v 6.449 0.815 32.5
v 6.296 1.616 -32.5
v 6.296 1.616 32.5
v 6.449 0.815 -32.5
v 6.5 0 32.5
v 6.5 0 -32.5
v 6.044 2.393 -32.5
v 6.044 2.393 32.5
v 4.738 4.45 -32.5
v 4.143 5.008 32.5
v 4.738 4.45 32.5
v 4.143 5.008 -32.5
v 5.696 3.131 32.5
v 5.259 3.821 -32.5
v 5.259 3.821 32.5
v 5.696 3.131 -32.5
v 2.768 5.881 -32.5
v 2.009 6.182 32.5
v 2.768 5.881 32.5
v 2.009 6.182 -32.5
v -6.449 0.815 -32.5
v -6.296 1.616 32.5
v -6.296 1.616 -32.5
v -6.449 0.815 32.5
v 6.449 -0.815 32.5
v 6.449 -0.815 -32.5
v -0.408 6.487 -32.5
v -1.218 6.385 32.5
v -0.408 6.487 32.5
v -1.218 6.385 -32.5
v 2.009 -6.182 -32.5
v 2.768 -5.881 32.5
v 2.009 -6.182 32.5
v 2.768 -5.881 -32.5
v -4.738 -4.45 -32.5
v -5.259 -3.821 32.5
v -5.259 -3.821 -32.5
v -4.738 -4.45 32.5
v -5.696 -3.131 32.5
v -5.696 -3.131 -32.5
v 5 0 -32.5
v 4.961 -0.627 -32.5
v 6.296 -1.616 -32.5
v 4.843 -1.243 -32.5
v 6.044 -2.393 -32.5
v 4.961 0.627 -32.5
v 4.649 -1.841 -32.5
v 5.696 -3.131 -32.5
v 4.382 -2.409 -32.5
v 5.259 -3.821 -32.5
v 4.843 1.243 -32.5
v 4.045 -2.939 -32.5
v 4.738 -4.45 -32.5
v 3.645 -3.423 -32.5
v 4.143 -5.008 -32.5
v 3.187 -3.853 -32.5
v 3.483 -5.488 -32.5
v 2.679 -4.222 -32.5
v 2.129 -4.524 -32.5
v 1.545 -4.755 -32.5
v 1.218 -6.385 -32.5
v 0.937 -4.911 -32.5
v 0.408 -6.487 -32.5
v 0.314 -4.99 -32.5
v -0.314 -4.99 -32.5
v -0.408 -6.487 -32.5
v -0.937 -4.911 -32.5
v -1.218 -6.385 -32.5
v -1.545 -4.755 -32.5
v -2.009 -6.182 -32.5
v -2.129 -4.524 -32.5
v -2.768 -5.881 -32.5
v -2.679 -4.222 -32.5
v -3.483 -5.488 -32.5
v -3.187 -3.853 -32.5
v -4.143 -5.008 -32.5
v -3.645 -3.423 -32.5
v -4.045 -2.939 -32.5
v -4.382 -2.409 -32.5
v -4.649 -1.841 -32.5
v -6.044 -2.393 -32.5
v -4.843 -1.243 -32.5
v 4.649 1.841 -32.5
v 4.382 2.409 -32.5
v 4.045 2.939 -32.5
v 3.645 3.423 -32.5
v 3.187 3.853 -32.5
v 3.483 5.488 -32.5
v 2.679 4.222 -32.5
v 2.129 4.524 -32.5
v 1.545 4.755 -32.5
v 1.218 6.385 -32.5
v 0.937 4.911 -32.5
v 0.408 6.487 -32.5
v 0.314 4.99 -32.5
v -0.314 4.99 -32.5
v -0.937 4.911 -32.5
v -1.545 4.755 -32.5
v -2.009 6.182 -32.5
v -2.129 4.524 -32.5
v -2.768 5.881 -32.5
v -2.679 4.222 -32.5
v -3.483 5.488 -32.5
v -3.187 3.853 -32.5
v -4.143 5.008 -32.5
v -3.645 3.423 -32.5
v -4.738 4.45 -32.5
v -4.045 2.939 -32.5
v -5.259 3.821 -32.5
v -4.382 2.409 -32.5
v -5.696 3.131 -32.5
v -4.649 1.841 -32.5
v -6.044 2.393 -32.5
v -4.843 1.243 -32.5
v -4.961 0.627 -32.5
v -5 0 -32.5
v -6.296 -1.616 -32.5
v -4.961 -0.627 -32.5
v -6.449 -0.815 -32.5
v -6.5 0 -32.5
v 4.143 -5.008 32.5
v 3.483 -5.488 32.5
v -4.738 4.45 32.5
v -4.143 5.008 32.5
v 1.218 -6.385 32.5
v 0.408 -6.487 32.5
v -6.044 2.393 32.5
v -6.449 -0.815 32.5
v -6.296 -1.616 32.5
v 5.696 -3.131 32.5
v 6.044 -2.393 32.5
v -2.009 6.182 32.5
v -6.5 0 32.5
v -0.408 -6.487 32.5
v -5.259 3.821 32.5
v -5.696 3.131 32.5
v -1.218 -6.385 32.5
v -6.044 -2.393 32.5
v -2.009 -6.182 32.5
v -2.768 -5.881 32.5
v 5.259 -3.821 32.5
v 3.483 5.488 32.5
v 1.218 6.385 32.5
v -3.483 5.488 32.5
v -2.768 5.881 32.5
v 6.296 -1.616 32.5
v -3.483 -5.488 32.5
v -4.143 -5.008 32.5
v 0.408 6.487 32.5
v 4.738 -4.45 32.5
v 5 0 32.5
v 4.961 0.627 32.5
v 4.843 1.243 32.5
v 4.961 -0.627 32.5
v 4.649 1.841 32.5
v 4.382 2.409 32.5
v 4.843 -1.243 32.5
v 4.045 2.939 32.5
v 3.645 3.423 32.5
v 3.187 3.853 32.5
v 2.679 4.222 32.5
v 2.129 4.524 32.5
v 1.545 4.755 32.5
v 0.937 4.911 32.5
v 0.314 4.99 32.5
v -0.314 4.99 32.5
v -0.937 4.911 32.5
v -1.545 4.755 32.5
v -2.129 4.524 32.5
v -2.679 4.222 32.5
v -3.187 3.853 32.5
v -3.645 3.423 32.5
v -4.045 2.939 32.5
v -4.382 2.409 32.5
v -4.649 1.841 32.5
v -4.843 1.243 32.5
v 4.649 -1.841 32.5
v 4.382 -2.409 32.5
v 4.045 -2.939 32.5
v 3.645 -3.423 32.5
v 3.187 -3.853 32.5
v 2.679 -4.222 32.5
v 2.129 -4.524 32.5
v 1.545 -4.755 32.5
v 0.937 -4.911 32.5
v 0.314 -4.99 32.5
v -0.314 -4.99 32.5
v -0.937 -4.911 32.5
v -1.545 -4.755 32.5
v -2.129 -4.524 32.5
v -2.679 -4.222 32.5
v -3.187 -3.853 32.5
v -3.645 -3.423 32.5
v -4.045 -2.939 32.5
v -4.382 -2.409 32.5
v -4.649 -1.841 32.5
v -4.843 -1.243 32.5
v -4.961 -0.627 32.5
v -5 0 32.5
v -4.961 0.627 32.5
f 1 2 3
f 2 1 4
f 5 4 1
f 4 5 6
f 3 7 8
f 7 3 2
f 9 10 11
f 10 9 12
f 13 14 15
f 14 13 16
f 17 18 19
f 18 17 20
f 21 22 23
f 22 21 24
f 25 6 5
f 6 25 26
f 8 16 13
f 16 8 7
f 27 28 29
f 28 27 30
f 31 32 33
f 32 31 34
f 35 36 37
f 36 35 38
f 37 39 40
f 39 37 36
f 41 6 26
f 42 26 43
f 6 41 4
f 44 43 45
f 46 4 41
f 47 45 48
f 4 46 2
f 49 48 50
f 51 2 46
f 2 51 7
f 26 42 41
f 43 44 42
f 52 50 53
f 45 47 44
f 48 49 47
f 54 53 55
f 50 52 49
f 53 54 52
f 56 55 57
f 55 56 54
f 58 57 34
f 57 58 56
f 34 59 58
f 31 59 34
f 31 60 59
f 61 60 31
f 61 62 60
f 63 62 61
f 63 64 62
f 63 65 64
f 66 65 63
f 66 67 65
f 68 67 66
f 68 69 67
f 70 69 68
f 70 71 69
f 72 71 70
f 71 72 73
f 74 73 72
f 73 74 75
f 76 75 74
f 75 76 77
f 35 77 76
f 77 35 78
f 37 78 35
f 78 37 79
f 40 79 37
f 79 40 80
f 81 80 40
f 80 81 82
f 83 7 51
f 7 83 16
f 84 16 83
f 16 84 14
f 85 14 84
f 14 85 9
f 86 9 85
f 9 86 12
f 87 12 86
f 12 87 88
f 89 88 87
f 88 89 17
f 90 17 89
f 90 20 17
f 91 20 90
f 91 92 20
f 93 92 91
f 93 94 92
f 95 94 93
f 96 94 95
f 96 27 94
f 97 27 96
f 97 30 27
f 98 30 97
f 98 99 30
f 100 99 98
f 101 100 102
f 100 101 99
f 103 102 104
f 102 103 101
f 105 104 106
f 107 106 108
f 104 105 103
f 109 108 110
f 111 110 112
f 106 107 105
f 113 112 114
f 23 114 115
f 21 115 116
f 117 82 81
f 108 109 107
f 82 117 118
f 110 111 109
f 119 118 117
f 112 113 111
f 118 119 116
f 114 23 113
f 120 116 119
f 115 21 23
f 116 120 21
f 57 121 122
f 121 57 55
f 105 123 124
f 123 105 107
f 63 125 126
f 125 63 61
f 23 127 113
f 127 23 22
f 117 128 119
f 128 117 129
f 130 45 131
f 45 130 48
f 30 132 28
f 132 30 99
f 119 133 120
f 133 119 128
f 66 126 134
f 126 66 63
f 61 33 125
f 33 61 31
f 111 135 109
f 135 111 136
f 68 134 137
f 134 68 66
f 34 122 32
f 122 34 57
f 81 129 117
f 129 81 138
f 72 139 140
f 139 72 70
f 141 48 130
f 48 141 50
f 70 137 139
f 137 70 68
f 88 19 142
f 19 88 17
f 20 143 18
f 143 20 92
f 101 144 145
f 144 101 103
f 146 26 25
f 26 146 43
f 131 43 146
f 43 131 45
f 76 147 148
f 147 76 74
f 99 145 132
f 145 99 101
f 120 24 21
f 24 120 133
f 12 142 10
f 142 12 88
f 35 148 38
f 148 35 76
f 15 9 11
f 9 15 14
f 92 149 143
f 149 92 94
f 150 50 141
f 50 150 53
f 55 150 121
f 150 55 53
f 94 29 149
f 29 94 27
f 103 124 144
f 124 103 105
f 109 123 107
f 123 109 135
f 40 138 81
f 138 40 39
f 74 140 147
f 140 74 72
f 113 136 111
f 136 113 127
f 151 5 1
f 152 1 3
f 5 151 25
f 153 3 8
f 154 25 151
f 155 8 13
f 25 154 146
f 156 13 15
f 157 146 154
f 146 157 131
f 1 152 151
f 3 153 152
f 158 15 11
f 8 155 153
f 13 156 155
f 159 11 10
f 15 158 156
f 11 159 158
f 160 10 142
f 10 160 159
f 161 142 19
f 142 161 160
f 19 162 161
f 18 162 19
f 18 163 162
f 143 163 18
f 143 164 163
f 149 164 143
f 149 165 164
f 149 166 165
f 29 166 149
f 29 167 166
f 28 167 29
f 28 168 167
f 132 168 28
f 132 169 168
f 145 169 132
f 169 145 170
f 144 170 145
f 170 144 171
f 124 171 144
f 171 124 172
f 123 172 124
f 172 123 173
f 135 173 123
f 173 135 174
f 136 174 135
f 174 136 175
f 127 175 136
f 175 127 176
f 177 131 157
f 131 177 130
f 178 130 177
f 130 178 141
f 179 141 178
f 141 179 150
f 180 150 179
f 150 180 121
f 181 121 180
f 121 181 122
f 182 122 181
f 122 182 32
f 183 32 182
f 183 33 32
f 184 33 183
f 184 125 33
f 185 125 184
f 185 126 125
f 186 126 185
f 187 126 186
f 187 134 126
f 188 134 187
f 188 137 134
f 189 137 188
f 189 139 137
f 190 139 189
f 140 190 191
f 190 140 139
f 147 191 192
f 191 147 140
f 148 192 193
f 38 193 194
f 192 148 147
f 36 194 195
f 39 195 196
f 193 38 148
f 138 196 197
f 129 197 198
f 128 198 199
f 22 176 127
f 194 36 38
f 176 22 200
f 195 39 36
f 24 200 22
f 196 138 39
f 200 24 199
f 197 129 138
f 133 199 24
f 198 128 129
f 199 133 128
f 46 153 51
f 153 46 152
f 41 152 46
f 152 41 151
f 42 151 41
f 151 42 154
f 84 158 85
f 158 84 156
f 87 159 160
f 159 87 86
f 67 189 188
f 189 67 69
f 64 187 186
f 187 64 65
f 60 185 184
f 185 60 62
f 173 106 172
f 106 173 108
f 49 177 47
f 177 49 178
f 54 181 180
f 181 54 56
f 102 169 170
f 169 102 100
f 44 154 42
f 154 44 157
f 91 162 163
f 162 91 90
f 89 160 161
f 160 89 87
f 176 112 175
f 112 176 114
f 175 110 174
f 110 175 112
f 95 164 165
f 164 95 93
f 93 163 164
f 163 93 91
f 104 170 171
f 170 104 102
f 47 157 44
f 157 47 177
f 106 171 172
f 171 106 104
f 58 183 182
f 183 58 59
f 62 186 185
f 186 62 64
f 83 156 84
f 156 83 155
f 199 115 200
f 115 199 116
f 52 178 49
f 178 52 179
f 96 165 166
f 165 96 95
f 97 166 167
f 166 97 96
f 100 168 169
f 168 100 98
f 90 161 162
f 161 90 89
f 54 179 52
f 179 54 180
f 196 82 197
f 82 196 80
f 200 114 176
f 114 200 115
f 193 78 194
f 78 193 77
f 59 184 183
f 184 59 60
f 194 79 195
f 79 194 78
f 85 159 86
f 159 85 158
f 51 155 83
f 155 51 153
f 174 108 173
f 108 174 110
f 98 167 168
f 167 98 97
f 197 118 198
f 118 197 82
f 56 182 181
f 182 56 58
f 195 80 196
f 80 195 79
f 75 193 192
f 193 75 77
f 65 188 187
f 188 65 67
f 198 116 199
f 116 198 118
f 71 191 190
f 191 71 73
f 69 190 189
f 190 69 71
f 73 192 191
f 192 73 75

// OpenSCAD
$fn = 50;


difference() {
	union() {
		translate(v = [0, 0, -32.5000000000]) {
			cylinder(h = 65, r = 6.5000000000);
		}
	}
	union() {
		translate(v = [0, 0, -100.0000000000]) {
			cylinder(h = 200, r = 5.0000000000);
		}
	}
}
